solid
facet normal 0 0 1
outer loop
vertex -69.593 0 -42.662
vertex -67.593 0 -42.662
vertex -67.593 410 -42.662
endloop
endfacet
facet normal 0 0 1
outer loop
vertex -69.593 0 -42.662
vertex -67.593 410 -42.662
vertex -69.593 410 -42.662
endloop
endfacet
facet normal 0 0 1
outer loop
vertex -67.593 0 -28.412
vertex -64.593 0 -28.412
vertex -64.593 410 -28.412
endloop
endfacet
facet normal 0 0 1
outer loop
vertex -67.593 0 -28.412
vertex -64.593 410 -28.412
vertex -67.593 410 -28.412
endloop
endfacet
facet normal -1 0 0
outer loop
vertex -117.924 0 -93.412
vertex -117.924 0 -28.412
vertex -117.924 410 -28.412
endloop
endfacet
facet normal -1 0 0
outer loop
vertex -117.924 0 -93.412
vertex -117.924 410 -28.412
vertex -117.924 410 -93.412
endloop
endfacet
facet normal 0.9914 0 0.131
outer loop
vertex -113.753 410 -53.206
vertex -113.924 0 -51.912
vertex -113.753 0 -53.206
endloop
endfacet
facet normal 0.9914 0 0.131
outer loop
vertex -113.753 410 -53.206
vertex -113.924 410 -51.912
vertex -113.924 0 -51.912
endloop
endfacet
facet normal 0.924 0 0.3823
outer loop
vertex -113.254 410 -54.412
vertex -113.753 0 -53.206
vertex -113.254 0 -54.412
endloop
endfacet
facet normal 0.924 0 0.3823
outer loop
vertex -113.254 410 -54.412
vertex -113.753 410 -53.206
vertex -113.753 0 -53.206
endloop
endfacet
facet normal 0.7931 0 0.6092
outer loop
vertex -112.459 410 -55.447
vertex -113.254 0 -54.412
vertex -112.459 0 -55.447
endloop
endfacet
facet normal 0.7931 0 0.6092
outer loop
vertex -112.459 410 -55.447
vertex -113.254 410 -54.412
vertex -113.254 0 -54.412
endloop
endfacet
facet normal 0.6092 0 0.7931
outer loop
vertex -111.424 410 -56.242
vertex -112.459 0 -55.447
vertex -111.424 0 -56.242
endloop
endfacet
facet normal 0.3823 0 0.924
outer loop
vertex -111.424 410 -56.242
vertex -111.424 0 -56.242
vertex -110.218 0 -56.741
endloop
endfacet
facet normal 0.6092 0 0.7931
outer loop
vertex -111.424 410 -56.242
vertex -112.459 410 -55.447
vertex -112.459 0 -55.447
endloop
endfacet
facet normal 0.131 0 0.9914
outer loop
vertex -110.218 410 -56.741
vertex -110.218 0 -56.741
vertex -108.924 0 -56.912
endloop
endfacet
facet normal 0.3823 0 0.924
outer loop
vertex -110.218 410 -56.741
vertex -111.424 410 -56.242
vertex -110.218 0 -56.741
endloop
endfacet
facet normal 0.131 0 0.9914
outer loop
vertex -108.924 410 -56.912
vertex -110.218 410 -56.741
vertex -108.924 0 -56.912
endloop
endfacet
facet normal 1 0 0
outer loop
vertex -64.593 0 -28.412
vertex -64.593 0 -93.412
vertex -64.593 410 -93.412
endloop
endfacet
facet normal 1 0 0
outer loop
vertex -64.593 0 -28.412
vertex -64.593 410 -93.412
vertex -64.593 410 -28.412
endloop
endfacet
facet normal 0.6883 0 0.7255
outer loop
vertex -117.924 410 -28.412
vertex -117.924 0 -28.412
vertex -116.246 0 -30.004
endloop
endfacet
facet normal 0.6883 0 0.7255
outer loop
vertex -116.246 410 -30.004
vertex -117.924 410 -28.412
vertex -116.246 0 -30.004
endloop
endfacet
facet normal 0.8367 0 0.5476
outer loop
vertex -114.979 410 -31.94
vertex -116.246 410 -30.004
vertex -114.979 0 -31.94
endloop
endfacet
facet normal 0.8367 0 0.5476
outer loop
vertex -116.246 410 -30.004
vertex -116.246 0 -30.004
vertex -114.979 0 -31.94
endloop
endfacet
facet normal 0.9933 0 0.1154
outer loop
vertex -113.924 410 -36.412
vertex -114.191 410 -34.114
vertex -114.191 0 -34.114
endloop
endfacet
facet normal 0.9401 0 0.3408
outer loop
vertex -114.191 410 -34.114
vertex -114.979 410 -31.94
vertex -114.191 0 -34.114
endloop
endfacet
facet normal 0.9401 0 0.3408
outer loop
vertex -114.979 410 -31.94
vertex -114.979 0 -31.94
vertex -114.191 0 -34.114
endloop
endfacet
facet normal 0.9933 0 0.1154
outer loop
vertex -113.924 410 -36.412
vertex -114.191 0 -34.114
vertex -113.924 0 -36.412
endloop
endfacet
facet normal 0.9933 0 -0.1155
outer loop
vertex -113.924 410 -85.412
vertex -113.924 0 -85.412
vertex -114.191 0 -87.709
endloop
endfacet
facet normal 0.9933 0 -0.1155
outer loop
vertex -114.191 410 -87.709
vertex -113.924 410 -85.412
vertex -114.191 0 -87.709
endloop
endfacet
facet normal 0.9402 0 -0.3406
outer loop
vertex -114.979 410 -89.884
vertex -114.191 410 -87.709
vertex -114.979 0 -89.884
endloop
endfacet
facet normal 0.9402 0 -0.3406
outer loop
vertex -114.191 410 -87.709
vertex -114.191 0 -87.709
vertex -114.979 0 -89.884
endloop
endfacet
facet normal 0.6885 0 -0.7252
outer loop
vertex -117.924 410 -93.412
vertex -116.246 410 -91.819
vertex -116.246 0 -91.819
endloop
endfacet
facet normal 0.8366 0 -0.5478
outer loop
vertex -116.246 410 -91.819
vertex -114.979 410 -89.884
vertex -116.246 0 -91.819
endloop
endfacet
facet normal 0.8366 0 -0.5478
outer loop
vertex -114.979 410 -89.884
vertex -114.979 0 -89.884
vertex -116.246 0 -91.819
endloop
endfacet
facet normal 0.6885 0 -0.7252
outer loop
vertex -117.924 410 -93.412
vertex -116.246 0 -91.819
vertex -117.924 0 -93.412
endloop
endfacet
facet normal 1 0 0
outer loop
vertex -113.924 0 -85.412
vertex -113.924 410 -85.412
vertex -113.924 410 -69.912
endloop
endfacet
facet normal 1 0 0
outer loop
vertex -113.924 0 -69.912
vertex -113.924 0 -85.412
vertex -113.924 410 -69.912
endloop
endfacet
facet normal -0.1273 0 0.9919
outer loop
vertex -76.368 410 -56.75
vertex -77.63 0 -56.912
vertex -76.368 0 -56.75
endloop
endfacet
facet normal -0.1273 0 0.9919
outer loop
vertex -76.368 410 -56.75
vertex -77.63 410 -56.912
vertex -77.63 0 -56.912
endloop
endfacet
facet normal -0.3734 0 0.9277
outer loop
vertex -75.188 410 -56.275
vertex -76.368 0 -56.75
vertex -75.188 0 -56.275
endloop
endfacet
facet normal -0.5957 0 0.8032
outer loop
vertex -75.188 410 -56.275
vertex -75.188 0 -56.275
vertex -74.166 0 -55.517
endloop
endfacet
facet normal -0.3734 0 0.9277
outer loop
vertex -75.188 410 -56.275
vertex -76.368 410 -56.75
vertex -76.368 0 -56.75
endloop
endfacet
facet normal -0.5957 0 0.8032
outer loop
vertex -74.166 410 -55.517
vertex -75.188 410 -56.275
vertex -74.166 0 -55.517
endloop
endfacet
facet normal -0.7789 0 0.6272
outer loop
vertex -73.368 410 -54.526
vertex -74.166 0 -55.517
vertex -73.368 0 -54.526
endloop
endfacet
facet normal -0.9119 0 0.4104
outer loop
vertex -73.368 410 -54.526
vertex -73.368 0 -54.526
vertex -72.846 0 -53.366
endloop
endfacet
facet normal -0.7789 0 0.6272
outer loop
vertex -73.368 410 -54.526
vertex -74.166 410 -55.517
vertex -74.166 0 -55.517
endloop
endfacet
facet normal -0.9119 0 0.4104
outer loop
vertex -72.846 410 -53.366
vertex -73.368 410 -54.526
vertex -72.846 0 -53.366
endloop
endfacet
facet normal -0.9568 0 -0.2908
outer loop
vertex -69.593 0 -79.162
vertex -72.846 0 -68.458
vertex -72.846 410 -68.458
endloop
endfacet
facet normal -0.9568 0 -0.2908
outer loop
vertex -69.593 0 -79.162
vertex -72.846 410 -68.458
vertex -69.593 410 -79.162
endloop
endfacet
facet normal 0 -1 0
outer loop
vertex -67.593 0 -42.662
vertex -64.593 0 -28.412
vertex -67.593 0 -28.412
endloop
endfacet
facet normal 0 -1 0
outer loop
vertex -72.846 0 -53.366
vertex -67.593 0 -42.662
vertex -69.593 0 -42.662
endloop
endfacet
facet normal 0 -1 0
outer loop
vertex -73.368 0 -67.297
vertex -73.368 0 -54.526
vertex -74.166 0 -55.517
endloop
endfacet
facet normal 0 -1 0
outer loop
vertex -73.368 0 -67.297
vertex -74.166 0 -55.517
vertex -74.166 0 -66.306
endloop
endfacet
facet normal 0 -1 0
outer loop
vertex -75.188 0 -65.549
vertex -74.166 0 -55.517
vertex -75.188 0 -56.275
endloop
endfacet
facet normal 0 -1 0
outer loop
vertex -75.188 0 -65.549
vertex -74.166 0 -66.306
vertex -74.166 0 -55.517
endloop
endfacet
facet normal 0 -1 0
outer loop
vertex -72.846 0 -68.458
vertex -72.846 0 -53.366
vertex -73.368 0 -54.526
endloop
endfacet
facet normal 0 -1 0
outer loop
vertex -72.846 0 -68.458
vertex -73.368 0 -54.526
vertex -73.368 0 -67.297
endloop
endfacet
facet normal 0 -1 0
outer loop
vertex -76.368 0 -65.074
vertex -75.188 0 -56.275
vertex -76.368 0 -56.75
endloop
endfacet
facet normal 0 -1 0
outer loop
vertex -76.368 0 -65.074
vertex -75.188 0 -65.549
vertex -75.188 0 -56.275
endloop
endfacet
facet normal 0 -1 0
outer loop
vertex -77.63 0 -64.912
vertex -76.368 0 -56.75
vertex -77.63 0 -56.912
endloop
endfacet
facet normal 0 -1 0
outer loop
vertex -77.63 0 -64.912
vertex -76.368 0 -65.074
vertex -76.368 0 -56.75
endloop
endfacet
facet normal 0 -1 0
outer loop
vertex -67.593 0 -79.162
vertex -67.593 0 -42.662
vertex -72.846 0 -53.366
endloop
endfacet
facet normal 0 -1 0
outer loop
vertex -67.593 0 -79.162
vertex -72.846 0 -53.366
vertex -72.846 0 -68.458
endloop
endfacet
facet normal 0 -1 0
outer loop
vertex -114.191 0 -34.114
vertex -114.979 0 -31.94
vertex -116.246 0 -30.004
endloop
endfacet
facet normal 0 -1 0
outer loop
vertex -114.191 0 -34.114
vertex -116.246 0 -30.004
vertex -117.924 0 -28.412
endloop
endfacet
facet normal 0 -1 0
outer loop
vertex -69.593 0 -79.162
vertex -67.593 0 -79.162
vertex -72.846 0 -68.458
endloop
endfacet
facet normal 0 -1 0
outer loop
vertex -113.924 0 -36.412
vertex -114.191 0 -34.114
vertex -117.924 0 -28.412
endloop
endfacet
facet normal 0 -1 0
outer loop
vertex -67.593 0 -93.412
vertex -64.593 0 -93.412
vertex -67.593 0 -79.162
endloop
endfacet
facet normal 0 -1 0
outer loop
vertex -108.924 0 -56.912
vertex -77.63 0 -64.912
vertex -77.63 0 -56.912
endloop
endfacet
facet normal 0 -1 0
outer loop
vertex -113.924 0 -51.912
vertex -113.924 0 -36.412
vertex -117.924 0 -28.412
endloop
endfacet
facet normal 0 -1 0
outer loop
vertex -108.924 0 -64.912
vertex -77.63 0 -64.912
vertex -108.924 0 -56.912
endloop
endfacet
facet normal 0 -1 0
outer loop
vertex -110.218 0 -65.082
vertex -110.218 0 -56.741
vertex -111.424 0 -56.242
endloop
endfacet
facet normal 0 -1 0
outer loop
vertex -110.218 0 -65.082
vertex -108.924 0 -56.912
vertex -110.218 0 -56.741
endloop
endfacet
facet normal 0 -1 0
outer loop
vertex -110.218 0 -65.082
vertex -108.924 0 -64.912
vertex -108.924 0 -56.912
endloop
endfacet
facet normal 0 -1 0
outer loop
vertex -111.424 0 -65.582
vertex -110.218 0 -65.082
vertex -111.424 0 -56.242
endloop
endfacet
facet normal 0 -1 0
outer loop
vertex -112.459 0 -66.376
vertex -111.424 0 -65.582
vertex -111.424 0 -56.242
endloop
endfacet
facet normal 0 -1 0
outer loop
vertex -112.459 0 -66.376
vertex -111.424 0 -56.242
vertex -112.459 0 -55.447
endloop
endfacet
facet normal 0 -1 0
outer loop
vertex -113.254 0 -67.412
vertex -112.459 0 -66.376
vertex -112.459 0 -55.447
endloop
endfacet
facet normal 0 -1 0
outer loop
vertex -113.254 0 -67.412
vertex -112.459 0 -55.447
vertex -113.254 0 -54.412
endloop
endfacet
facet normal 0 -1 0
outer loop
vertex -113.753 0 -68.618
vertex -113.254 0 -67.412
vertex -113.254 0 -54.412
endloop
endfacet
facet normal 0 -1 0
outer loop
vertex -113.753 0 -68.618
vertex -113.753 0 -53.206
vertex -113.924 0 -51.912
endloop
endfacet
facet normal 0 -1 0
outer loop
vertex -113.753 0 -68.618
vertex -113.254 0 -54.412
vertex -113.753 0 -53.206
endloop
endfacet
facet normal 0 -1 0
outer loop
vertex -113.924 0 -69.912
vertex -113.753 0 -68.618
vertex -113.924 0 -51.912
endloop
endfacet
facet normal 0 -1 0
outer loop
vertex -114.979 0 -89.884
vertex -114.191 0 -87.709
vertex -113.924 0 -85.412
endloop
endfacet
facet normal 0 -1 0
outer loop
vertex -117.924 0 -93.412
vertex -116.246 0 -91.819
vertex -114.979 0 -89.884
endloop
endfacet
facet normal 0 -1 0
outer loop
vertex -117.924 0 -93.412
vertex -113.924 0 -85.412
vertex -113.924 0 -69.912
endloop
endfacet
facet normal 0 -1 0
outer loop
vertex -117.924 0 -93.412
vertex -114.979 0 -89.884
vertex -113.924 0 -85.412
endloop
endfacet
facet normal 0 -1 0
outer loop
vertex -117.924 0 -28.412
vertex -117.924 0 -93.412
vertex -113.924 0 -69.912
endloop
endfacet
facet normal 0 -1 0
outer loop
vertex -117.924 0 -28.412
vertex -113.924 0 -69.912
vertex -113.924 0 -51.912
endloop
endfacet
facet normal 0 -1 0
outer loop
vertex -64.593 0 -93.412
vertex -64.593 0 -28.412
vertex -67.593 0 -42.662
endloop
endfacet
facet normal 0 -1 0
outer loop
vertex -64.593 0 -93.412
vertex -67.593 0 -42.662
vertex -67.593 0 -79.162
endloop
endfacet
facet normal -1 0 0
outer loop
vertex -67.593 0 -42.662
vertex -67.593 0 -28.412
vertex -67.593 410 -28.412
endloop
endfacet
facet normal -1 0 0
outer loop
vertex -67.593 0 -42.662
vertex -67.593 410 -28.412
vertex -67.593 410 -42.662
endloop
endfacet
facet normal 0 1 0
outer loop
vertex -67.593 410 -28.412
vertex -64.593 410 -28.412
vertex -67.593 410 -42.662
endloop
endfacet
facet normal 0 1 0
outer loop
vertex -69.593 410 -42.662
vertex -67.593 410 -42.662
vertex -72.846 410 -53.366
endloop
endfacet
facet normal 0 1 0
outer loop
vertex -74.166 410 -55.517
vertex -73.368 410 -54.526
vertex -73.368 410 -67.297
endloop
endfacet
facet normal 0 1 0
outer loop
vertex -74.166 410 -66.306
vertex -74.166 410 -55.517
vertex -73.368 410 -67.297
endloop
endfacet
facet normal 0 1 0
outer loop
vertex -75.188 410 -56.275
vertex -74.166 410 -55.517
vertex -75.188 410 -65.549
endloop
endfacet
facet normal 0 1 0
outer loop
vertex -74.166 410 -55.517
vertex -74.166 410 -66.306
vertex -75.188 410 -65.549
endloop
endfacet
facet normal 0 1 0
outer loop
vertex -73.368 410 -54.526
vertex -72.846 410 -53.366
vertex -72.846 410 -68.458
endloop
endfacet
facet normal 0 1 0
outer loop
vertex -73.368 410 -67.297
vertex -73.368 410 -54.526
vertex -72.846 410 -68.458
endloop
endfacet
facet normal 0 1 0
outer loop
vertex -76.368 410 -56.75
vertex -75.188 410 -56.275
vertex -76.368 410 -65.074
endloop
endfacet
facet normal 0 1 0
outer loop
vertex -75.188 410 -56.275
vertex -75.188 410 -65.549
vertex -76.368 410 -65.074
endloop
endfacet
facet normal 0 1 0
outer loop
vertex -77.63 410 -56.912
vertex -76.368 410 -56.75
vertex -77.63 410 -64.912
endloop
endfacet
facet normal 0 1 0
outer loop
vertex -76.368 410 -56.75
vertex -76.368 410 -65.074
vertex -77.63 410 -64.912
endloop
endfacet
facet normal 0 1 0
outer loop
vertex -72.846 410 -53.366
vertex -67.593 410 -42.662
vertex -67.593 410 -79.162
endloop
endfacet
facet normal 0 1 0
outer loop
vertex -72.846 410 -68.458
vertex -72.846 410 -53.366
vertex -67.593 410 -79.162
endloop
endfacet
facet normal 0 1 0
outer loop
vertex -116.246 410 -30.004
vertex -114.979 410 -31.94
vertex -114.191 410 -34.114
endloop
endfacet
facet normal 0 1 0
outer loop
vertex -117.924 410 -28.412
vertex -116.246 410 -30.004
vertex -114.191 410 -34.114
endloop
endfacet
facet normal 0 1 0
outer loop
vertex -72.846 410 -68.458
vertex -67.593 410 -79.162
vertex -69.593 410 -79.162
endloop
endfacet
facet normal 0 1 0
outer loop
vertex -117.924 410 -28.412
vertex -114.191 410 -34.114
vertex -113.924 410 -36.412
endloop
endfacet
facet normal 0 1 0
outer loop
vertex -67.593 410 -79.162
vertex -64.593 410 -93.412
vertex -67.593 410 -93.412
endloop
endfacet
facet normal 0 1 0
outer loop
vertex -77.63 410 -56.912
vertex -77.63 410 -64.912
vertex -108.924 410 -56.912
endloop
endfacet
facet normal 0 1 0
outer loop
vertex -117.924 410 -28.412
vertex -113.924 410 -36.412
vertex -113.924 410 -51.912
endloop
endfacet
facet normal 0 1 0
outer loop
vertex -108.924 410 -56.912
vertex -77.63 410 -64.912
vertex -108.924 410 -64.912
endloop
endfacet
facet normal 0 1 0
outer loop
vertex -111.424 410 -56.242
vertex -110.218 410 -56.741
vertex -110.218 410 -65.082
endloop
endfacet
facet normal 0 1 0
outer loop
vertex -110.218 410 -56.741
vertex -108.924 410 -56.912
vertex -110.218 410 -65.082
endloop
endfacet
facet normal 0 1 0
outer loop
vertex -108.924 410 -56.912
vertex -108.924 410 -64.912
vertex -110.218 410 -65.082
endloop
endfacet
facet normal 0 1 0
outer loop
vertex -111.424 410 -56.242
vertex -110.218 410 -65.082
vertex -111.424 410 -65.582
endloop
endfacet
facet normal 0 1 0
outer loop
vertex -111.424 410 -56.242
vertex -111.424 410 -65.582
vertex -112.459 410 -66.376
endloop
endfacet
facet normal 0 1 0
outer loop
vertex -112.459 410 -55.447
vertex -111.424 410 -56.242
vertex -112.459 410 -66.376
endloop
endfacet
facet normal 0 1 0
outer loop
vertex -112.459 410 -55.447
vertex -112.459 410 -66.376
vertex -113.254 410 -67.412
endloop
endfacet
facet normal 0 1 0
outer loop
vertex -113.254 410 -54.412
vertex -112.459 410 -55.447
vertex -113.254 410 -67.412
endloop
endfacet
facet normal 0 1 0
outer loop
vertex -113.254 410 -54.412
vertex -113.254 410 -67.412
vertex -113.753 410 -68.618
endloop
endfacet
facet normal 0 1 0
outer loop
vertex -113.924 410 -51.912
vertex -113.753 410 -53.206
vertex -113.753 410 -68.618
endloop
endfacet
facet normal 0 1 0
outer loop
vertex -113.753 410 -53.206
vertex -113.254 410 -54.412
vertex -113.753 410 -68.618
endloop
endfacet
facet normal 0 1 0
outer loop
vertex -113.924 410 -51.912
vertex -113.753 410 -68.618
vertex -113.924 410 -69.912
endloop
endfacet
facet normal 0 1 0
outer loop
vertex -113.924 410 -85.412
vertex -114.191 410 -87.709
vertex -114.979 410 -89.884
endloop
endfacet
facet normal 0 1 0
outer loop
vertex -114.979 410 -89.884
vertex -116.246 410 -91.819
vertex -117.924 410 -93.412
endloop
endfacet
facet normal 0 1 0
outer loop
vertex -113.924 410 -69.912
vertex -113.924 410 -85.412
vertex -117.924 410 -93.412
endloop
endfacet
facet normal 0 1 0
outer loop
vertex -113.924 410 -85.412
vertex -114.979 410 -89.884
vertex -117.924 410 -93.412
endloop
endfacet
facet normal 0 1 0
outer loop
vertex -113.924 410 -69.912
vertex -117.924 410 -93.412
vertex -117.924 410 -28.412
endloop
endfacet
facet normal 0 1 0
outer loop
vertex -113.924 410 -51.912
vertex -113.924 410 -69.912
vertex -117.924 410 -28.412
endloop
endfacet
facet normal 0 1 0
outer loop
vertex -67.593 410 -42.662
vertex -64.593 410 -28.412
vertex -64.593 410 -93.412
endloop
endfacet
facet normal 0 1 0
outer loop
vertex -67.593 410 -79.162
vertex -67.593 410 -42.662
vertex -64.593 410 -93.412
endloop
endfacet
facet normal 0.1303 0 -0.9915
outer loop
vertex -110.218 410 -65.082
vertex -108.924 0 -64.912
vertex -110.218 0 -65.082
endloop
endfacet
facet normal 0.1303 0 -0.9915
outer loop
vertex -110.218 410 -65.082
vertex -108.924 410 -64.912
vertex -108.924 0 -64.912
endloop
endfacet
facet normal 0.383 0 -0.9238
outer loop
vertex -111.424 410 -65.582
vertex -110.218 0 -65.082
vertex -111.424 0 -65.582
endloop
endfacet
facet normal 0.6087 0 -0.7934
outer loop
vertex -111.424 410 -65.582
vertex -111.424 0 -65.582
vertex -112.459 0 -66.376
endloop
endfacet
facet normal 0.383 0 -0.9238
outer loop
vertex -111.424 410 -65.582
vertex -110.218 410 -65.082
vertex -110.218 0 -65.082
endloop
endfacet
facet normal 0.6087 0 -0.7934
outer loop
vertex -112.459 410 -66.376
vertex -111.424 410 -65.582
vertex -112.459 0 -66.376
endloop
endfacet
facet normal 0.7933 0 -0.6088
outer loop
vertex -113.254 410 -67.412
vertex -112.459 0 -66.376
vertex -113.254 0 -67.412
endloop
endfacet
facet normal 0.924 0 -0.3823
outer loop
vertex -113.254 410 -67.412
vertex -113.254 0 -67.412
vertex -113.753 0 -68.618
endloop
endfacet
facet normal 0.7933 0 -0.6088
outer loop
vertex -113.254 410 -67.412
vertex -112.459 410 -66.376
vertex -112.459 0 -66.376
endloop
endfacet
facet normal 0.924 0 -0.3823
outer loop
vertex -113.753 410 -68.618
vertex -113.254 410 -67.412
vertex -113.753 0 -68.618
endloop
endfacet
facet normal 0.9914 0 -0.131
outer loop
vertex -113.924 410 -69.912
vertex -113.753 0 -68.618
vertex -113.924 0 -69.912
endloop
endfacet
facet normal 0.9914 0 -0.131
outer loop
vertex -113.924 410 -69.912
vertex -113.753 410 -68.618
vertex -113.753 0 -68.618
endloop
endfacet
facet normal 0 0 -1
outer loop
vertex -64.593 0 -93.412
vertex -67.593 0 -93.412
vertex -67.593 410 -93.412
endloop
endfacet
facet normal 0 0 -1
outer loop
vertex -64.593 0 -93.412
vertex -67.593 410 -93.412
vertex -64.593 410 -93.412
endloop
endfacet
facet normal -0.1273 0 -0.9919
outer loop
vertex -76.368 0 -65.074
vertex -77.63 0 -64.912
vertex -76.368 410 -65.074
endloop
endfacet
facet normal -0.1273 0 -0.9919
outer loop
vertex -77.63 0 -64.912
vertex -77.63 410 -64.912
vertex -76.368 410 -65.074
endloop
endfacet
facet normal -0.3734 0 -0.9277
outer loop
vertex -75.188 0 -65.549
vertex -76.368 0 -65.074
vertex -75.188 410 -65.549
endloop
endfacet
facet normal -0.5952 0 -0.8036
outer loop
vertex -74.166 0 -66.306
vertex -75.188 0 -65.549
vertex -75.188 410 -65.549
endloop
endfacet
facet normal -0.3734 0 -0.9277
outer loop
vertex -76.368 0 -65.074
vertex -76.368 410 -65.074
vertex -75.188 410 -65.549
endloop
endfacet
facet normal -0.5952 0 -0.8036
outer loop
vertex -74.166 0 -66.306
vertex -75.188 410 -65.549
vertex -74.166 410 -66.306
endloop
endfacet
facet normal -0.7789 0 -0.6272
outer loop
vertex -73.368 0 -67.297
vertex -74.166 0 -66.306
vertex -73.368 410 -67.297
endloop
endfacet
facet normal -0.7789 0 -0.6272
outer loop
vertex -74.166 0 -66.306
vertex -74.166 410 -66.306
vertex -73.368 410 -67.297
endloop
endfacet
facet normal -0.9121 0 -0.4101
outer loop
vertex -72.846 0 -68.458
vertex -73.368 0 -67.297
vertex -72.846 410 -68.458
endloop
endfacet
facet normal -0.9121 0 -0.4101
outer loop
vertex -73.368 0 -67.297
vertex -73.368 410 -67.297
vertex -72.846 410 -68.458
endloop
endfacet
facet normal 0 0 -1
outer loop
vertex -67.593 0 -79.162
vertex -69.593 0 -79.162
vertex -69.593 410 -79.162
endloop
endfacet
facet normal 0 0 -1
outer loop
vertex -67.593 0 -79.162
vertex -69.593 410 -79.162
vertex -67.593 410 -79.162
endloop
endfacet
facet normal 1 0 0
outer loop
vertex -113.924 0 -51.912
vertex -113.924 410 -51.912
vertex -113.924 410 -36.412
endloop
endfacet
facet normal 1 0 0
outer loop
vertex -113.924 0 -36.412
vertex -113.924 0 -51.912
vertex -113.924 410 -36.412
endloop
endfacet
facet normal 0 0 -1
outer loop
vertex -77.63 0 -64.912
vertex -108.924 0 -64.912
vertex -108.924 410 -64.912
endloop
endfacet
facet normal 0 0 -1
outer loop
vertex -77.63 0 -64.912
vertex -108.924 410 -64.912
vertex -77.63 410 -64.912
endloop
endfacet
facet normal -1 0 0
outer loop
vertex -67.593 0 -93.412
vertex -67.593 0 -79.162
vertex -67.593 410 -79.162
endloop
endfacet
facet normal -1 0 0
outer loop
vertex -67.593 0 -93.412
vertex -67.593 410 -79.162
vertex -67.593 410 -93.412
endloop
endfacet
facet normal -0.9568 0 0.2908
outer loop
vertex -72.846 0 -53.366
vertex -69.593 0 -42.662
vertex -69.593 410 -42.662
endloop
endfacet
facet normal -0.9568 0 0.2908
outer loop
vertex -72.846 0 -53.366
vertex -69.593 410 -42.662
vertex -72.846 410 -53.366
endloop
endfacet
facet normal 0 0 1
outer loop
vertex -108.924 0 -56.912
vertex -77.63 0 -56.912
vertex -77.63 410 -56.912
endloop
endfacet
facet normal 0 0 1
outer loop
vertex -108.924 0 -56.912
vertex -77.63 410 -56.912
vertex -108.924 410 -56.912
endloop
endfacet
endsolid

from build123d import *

# Parameters (mm, degrees)
BOSS_EXTRUDE2_DEPTH = 410
FILLET1_R           = 10
FILLET2_R           = 5


with BuildPart() as part:
    # Sketch1 → Boss-Extrude2 (new body)
    with BuildSketch(Plane(origin=(0, 0, 0), x_dir=(1, 0, 0), z_dir=(0, 1, 0))):
        Polygon((-113.923660484, 64.911766887), (-73.923660484, 64.911766887), (-69.59269291, 79.161766887), (-67.59269291, 79.161766887), (-67.59269291, 93.411766887), (-64.59269291, 93.411766887), (-64.59269291, 28.411766887), (-67.59269291, 28.411766887), (-67.59269291, 42.661766887), (-69.59269291, 42.661766887), (-73.923660484, 56.911766887), (-113.923660484, 56.911766887), (-113.923660484, 28.411766887), (-117.923660484, 28.411766887), (-117.923660484, 93.411766887), (-113.923660484, 93.411766887), align=None)
    extrude(amount=BOSS_EXTRUDE2_DEPTH)

    # Fillet1
    # the kernel refuses this fillet: 10 mm, written as the material it takes off along each edge
    with BuildSketch(Plane(origin=(-113.923660484, -20, -93.411766887), x_dir=(-1, 0, 0), z_dir=(0, 1, 0))) as fillet1_piece_1:
        with BuildLine():
            CenterArc((10, 8), FILLET1_R, 180, 53.130102354)
            Line((0, 8), (-0.2, 8))
            Line((-0.2, 8), (-0.2, 0))
            Line((-0.2, 0), (0, -0.2))
            ThreePointArc((0, -0.2), (2, -0.2), (3.88, -0.16))
            Line((3.88, -0.16), (4, 0))
        make_face()
    extrude(amount=450, mode=Mode.SUBTRACT)
    with BuildSketch(Plane(origin=(-113.923660484, -20, -28.411766887), x_dir=(0, 0, -1), z_dir=(0, 1, 0))) as fillet1_piece_2:
        with BuildLine():
            CenterArc((8, 10), FILLET1_R, 216.869897646, 53.130102354)
            Line((0, 4), (-0.16, 3.88))
            ThreePointArc((-0.16, 3.88), (-0.2, 2), (-0.2, 0))
            Line((-0.2, 0), (0, -0.2))
            Line((0, -0.2), (8, -0.2))
            Line((8, -0.2), (8, 0))
        make_face()
    extrude(amount=450, mode=Mode.SUBTRACT)

    # Fillet2
    fillet2_edges = [part.edges().sort_by_distance(p)[0] for p in [
        (-113.923660484, 205, -64.911766887),
        (-73.923660484, 205, -64.911766887),
        (-73.923660484, 205, -56.911766887),
        (-113.923660484, 205, -56.911766887),
    ]]
    fillet(fillet2_edges, radius=FILLET2_R)


solid = part.part
